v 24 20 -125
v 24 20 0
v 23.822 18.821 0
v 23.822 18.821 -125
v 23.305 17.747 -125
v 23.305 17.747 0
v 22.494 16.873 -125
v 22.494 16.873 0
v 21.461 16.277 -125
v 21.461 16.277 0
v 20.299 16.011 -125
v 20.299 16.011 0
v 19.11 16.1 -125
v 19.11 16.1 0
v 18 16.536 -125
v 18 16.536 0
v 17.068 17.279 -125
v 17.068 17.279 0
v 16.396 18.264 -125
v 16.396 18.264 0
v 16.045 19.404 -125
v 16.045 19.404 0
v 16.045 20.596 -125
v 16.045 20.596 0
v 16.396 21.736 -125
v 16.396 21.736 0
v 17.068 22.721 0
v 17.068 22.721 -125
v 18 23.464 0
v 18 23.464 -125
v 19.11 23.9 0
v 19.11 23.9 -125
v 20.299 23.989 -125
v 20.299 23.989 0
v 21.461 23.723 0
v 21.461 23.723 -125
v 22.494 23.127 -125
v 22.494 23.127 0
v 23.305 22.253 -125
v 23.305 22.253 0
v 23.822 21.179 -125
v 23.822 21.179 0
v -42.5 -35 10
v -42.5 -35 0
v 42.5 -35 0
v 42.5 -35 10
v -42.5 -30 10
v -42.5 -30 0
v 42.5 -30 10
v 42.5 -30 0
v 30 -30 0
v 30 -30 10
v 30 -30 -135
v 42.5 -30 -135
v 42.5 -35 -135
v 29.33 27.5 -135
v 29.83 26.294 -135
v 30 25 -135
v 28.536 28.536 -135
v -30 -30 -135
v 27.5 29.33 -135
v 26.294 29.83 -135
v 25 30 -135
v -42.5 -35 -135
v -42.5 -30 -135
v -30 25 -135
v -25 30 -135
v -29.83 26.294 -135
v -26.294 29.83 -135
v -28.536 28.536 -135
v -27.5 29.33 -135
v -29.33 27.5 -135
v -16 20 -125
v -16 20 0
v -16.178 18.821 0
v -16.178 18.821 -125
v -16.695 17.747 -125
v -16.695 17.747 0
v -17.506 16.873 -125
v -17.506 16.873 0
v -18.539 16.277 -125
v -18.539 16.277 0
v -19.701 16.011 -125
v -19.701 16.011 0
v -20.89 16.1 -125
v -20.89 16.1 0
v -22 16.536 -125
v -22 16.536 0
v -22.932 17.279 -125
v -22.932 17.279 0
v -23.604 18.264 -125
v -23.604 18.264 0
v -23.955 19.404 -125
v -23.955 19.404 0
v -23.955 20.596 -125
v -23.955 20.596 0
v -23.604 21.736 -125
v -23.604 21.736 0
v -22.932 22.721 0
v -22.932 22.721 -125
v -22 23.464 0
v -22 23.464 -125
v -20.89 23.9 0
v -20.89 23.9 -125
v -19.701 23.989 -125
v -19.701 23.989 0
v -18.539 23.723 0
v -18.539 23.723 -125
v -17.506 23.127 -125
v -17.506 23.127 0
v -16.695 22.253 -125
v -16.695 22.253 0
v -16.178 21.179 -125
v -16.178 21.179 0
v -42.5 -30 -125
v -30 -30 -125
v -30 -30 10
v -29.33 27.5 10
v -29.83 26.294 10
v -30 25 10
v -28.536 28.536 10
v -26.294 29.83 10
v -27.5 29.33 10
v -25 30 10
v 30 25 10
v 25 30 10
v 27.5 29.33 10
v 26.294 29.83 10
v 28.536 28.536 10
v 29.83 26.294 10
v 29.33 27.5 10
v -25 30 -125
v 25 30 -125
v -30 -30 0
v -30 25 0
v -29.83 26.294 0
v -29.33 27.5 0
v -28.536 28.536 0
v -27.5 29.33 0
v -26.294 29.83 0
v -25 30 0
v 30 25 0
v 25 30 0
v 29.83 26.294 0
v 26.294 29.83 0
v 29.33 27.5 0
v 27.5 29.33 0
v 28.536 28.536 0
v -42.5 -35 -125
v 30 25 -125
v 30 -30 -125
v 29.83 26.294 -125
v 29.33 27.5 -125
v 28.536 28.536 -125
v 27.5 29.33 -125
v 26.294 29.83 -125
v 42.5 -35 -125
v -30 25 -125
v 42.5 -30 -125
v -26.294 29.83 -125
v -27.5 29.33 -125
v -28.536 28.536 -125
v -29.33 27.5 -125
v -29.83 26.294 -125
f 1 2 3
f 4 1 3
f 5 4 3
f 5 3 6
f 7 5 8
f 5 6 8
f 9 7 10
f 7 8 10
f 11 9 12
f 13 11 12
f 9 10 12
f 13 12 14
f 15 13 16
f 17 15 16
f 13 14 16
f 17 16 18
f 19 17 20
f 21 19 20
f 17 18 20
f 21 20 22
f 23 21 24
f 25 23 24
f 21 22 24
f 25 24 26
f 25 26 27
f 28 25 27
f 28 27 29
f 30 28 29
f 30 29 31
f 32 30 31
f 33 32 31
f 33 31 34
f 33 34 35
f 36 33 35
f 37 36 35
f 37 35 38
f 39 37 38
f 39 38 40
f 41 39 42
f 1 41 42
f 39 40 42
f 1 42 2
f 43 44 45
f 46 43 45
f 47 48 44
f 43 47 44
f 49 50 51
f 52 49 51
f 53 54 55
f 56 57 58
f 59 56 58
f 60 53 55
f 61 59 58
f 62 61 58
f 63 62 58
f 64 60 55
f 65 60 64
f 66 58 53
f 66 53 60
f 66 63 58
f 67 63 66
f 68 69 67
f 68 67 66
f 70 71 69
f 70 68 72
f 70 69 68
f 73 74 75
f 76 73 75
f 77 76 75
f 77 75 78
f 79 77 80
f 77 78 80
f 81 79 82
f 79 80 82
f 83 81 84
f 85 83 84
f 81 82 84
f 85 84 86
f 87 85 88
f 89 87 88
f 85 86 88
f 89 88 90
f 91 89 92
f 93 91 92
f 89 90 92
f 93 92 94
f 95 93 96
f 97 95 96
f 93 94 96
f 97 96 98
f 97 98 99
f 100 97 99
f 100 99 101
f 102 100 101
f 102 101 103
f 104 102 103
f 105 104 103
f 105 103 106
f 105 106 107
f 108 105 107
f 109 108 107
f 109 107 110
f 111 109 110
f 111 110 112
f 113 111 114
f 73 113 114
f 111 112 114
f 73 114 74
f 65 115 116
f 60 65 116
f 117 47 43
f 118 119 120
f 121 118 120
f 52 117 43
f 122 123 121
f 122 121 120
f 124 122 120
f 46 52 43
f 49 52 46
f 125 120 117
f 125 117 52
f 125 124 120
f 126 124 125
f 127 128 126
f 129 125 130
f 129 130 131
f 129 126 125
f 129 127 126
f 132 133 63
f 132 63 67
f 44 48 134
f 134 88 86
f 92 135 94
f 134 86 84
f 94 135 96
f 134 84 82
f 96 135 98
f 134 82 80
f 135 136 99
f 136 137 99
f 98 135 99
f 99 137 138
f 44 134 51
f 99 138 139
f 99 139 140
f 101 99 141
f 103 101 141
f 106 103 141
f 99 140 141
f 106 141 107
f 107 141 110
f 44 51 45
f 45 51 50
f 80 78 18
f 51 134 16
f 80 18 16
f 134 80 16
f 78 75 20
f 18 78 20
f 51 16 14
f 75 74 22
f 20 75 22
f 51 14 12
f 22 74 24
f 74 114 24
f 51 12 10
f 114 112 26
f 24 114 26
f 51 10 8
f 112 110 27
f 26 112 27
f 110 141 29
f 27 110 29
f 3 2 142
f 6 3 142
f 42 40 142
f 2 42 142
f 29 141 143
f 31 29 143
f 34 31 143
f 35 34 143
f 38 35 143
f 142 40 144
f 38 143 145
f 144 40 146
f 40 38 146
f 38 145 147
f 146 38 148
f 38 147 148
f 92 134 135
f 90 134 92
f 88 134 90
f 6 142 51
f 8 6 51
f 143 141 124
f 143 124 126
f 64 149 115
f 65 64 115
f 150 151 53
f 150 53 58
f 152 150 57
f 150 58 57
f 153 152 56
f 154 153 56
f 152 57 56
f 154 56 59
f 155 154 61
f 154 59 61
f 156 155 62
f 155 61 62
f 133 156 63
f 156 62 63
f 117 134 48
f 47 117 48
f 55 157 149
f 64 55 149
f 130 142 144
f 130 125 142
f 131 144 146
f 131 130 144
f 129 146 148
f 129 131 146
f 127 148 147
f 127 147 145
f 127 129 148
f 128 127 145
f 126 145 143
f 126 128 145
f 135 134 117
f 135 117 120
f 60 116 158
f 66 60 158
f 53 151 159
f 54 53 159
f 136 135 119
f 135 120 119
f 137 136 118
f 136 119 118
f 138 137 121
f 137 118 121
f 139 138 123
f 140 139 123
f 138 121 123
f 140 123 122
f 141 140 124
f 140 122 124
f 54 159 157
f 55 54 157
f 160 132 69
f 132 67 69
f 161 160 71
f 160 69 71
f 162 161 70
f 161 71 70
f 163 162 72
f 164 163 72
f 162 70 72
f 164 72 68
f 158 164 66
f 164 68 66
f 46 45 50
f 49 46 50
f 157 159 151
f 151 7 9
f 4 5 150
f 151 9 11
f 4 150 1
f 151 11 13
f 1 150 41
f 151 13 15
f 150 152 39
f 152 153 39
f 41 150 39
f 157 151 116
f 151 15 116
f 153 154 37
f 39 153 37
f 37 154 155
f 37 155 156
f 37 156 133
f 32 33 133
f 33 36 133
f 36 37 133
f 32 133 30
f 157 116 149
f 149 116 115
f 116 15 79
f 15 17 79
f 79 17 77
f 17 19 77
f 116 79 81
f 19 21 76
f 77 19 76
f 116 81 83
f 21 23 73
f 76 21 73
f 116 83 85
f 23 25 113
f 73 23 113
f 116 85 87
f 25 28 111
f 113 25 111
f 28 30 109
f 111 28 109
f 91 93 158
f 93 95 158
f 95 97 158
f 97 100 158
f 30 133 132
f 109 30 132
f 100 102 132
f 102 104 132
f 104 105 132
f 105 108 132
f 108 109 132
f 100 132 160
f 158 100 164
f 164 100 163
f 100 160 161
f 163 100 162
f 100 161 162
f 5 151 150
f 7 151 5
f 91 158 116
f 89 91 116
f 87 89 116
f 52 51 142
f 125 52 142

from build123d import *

# Parameters (mm, degrees)
CROQUIS1_W              = 60
CROQUIS1_H              = 60
SALIENTE_EXTRUIR1_DEPTH = 10
REDONDEO1_R             = 5
CROQUIS2_R              = 4
SALIENTE_EXTRUIR2_DEPTH = 125
CROQUIS3_W              = 60
CROQUIS3_H              = 60
CROQUIS3_R              = 4
SALIENTE_EXTRUIR4_DEPTH = 10
REDONDEO2_R             = 5


with BuildPart() as part:
    # Croquis1 → Saliente-Extruir1 (new body)
    with BuildSketch(Plane.XY):
        Rectangle(CROQUIS1_W, CROQUIS1_H)
        Polygon((42.5, -30), (30, -30), (-30, -30), (-42.5, -30), (-42.5, -35), (42.5, -35), align=None)
    extrude(amount=SALIENTE_EXTRUIR1_DEPTH)

    # Redondeo1
    redondeo1_edges = [part.edges().sort_by_distance(p)[0] for p in [
        (30, 30, 5),
        (-30, 30, 5),
    ]]
    fillet(redondeo1_edges, radius=REDONDEO1_R)

    # Croquis2 → Saliente-Extruir2 (add)
    with BuildSketch(Plane(origin=(0, 0, 0), x_dir=(-1, 0, 0), z_dir=(0, 0, -1))):
        with Locations(Location((-20, 20, 0), (0, 0, 180))):
            Circle(CROQUIS2_R)
        with Locations(Location((20, 20, 0), (0, 0, 180))):
            Circle(CROQUIS2_R)
    extrude(amount=SALIENTE_EXTRUIR2_DEPTH)

    # Croquis3 → Saliente-Extruir4 (add)
    # profile 1 of 3: a face of its own
    with BuildSketch(Plane(origin=(0, 0, -125), x_dir=(-1, 0, 0), z_dir=(0, 0, -1))):
        Rectangle(CROQUIS3_W, CROQUIS3_H)
        with Locations(Location((20, 20, 0), (0, 0, 180))):
            Circle(CROQUIS3_R, mode=Mode.SUBTRACT)
    # profile 2 of 3: a face of its own
    with BuildSketch(Plane(origin=(0, 0, -125), x_dir=(-1, 0, 0), z_dir=(0, 0, -1))):
        Polygon((30, -30), (-30, -30), (-42.5, -30), (-42.5, -35), (42.5, -35), (42.5, -30), align=None)
    # profile 3 of 3: a face of its own
    with BuildSketch(Plane(origin=(0, 0, -125), x_dir=(-1, 0, 0), z_dir=(0, 0, -1))):
        with Locations(Location((20, 20, 0), (0, 0, 180))):
            Circle(CROQUIS3_R)
    extrude(amount=SALIENTE_EXTRUIR4_DEPTH)

    # Redondeo2
    redondeo2_edges = [part.edges().sort_by_distance(p)[0] for p in [
        (-30, 30, -130),
        (30, 30, -130),
    ]]
    fillet(redondeo2_edges, radius=REDONDEO2_R)


solid = part.part
